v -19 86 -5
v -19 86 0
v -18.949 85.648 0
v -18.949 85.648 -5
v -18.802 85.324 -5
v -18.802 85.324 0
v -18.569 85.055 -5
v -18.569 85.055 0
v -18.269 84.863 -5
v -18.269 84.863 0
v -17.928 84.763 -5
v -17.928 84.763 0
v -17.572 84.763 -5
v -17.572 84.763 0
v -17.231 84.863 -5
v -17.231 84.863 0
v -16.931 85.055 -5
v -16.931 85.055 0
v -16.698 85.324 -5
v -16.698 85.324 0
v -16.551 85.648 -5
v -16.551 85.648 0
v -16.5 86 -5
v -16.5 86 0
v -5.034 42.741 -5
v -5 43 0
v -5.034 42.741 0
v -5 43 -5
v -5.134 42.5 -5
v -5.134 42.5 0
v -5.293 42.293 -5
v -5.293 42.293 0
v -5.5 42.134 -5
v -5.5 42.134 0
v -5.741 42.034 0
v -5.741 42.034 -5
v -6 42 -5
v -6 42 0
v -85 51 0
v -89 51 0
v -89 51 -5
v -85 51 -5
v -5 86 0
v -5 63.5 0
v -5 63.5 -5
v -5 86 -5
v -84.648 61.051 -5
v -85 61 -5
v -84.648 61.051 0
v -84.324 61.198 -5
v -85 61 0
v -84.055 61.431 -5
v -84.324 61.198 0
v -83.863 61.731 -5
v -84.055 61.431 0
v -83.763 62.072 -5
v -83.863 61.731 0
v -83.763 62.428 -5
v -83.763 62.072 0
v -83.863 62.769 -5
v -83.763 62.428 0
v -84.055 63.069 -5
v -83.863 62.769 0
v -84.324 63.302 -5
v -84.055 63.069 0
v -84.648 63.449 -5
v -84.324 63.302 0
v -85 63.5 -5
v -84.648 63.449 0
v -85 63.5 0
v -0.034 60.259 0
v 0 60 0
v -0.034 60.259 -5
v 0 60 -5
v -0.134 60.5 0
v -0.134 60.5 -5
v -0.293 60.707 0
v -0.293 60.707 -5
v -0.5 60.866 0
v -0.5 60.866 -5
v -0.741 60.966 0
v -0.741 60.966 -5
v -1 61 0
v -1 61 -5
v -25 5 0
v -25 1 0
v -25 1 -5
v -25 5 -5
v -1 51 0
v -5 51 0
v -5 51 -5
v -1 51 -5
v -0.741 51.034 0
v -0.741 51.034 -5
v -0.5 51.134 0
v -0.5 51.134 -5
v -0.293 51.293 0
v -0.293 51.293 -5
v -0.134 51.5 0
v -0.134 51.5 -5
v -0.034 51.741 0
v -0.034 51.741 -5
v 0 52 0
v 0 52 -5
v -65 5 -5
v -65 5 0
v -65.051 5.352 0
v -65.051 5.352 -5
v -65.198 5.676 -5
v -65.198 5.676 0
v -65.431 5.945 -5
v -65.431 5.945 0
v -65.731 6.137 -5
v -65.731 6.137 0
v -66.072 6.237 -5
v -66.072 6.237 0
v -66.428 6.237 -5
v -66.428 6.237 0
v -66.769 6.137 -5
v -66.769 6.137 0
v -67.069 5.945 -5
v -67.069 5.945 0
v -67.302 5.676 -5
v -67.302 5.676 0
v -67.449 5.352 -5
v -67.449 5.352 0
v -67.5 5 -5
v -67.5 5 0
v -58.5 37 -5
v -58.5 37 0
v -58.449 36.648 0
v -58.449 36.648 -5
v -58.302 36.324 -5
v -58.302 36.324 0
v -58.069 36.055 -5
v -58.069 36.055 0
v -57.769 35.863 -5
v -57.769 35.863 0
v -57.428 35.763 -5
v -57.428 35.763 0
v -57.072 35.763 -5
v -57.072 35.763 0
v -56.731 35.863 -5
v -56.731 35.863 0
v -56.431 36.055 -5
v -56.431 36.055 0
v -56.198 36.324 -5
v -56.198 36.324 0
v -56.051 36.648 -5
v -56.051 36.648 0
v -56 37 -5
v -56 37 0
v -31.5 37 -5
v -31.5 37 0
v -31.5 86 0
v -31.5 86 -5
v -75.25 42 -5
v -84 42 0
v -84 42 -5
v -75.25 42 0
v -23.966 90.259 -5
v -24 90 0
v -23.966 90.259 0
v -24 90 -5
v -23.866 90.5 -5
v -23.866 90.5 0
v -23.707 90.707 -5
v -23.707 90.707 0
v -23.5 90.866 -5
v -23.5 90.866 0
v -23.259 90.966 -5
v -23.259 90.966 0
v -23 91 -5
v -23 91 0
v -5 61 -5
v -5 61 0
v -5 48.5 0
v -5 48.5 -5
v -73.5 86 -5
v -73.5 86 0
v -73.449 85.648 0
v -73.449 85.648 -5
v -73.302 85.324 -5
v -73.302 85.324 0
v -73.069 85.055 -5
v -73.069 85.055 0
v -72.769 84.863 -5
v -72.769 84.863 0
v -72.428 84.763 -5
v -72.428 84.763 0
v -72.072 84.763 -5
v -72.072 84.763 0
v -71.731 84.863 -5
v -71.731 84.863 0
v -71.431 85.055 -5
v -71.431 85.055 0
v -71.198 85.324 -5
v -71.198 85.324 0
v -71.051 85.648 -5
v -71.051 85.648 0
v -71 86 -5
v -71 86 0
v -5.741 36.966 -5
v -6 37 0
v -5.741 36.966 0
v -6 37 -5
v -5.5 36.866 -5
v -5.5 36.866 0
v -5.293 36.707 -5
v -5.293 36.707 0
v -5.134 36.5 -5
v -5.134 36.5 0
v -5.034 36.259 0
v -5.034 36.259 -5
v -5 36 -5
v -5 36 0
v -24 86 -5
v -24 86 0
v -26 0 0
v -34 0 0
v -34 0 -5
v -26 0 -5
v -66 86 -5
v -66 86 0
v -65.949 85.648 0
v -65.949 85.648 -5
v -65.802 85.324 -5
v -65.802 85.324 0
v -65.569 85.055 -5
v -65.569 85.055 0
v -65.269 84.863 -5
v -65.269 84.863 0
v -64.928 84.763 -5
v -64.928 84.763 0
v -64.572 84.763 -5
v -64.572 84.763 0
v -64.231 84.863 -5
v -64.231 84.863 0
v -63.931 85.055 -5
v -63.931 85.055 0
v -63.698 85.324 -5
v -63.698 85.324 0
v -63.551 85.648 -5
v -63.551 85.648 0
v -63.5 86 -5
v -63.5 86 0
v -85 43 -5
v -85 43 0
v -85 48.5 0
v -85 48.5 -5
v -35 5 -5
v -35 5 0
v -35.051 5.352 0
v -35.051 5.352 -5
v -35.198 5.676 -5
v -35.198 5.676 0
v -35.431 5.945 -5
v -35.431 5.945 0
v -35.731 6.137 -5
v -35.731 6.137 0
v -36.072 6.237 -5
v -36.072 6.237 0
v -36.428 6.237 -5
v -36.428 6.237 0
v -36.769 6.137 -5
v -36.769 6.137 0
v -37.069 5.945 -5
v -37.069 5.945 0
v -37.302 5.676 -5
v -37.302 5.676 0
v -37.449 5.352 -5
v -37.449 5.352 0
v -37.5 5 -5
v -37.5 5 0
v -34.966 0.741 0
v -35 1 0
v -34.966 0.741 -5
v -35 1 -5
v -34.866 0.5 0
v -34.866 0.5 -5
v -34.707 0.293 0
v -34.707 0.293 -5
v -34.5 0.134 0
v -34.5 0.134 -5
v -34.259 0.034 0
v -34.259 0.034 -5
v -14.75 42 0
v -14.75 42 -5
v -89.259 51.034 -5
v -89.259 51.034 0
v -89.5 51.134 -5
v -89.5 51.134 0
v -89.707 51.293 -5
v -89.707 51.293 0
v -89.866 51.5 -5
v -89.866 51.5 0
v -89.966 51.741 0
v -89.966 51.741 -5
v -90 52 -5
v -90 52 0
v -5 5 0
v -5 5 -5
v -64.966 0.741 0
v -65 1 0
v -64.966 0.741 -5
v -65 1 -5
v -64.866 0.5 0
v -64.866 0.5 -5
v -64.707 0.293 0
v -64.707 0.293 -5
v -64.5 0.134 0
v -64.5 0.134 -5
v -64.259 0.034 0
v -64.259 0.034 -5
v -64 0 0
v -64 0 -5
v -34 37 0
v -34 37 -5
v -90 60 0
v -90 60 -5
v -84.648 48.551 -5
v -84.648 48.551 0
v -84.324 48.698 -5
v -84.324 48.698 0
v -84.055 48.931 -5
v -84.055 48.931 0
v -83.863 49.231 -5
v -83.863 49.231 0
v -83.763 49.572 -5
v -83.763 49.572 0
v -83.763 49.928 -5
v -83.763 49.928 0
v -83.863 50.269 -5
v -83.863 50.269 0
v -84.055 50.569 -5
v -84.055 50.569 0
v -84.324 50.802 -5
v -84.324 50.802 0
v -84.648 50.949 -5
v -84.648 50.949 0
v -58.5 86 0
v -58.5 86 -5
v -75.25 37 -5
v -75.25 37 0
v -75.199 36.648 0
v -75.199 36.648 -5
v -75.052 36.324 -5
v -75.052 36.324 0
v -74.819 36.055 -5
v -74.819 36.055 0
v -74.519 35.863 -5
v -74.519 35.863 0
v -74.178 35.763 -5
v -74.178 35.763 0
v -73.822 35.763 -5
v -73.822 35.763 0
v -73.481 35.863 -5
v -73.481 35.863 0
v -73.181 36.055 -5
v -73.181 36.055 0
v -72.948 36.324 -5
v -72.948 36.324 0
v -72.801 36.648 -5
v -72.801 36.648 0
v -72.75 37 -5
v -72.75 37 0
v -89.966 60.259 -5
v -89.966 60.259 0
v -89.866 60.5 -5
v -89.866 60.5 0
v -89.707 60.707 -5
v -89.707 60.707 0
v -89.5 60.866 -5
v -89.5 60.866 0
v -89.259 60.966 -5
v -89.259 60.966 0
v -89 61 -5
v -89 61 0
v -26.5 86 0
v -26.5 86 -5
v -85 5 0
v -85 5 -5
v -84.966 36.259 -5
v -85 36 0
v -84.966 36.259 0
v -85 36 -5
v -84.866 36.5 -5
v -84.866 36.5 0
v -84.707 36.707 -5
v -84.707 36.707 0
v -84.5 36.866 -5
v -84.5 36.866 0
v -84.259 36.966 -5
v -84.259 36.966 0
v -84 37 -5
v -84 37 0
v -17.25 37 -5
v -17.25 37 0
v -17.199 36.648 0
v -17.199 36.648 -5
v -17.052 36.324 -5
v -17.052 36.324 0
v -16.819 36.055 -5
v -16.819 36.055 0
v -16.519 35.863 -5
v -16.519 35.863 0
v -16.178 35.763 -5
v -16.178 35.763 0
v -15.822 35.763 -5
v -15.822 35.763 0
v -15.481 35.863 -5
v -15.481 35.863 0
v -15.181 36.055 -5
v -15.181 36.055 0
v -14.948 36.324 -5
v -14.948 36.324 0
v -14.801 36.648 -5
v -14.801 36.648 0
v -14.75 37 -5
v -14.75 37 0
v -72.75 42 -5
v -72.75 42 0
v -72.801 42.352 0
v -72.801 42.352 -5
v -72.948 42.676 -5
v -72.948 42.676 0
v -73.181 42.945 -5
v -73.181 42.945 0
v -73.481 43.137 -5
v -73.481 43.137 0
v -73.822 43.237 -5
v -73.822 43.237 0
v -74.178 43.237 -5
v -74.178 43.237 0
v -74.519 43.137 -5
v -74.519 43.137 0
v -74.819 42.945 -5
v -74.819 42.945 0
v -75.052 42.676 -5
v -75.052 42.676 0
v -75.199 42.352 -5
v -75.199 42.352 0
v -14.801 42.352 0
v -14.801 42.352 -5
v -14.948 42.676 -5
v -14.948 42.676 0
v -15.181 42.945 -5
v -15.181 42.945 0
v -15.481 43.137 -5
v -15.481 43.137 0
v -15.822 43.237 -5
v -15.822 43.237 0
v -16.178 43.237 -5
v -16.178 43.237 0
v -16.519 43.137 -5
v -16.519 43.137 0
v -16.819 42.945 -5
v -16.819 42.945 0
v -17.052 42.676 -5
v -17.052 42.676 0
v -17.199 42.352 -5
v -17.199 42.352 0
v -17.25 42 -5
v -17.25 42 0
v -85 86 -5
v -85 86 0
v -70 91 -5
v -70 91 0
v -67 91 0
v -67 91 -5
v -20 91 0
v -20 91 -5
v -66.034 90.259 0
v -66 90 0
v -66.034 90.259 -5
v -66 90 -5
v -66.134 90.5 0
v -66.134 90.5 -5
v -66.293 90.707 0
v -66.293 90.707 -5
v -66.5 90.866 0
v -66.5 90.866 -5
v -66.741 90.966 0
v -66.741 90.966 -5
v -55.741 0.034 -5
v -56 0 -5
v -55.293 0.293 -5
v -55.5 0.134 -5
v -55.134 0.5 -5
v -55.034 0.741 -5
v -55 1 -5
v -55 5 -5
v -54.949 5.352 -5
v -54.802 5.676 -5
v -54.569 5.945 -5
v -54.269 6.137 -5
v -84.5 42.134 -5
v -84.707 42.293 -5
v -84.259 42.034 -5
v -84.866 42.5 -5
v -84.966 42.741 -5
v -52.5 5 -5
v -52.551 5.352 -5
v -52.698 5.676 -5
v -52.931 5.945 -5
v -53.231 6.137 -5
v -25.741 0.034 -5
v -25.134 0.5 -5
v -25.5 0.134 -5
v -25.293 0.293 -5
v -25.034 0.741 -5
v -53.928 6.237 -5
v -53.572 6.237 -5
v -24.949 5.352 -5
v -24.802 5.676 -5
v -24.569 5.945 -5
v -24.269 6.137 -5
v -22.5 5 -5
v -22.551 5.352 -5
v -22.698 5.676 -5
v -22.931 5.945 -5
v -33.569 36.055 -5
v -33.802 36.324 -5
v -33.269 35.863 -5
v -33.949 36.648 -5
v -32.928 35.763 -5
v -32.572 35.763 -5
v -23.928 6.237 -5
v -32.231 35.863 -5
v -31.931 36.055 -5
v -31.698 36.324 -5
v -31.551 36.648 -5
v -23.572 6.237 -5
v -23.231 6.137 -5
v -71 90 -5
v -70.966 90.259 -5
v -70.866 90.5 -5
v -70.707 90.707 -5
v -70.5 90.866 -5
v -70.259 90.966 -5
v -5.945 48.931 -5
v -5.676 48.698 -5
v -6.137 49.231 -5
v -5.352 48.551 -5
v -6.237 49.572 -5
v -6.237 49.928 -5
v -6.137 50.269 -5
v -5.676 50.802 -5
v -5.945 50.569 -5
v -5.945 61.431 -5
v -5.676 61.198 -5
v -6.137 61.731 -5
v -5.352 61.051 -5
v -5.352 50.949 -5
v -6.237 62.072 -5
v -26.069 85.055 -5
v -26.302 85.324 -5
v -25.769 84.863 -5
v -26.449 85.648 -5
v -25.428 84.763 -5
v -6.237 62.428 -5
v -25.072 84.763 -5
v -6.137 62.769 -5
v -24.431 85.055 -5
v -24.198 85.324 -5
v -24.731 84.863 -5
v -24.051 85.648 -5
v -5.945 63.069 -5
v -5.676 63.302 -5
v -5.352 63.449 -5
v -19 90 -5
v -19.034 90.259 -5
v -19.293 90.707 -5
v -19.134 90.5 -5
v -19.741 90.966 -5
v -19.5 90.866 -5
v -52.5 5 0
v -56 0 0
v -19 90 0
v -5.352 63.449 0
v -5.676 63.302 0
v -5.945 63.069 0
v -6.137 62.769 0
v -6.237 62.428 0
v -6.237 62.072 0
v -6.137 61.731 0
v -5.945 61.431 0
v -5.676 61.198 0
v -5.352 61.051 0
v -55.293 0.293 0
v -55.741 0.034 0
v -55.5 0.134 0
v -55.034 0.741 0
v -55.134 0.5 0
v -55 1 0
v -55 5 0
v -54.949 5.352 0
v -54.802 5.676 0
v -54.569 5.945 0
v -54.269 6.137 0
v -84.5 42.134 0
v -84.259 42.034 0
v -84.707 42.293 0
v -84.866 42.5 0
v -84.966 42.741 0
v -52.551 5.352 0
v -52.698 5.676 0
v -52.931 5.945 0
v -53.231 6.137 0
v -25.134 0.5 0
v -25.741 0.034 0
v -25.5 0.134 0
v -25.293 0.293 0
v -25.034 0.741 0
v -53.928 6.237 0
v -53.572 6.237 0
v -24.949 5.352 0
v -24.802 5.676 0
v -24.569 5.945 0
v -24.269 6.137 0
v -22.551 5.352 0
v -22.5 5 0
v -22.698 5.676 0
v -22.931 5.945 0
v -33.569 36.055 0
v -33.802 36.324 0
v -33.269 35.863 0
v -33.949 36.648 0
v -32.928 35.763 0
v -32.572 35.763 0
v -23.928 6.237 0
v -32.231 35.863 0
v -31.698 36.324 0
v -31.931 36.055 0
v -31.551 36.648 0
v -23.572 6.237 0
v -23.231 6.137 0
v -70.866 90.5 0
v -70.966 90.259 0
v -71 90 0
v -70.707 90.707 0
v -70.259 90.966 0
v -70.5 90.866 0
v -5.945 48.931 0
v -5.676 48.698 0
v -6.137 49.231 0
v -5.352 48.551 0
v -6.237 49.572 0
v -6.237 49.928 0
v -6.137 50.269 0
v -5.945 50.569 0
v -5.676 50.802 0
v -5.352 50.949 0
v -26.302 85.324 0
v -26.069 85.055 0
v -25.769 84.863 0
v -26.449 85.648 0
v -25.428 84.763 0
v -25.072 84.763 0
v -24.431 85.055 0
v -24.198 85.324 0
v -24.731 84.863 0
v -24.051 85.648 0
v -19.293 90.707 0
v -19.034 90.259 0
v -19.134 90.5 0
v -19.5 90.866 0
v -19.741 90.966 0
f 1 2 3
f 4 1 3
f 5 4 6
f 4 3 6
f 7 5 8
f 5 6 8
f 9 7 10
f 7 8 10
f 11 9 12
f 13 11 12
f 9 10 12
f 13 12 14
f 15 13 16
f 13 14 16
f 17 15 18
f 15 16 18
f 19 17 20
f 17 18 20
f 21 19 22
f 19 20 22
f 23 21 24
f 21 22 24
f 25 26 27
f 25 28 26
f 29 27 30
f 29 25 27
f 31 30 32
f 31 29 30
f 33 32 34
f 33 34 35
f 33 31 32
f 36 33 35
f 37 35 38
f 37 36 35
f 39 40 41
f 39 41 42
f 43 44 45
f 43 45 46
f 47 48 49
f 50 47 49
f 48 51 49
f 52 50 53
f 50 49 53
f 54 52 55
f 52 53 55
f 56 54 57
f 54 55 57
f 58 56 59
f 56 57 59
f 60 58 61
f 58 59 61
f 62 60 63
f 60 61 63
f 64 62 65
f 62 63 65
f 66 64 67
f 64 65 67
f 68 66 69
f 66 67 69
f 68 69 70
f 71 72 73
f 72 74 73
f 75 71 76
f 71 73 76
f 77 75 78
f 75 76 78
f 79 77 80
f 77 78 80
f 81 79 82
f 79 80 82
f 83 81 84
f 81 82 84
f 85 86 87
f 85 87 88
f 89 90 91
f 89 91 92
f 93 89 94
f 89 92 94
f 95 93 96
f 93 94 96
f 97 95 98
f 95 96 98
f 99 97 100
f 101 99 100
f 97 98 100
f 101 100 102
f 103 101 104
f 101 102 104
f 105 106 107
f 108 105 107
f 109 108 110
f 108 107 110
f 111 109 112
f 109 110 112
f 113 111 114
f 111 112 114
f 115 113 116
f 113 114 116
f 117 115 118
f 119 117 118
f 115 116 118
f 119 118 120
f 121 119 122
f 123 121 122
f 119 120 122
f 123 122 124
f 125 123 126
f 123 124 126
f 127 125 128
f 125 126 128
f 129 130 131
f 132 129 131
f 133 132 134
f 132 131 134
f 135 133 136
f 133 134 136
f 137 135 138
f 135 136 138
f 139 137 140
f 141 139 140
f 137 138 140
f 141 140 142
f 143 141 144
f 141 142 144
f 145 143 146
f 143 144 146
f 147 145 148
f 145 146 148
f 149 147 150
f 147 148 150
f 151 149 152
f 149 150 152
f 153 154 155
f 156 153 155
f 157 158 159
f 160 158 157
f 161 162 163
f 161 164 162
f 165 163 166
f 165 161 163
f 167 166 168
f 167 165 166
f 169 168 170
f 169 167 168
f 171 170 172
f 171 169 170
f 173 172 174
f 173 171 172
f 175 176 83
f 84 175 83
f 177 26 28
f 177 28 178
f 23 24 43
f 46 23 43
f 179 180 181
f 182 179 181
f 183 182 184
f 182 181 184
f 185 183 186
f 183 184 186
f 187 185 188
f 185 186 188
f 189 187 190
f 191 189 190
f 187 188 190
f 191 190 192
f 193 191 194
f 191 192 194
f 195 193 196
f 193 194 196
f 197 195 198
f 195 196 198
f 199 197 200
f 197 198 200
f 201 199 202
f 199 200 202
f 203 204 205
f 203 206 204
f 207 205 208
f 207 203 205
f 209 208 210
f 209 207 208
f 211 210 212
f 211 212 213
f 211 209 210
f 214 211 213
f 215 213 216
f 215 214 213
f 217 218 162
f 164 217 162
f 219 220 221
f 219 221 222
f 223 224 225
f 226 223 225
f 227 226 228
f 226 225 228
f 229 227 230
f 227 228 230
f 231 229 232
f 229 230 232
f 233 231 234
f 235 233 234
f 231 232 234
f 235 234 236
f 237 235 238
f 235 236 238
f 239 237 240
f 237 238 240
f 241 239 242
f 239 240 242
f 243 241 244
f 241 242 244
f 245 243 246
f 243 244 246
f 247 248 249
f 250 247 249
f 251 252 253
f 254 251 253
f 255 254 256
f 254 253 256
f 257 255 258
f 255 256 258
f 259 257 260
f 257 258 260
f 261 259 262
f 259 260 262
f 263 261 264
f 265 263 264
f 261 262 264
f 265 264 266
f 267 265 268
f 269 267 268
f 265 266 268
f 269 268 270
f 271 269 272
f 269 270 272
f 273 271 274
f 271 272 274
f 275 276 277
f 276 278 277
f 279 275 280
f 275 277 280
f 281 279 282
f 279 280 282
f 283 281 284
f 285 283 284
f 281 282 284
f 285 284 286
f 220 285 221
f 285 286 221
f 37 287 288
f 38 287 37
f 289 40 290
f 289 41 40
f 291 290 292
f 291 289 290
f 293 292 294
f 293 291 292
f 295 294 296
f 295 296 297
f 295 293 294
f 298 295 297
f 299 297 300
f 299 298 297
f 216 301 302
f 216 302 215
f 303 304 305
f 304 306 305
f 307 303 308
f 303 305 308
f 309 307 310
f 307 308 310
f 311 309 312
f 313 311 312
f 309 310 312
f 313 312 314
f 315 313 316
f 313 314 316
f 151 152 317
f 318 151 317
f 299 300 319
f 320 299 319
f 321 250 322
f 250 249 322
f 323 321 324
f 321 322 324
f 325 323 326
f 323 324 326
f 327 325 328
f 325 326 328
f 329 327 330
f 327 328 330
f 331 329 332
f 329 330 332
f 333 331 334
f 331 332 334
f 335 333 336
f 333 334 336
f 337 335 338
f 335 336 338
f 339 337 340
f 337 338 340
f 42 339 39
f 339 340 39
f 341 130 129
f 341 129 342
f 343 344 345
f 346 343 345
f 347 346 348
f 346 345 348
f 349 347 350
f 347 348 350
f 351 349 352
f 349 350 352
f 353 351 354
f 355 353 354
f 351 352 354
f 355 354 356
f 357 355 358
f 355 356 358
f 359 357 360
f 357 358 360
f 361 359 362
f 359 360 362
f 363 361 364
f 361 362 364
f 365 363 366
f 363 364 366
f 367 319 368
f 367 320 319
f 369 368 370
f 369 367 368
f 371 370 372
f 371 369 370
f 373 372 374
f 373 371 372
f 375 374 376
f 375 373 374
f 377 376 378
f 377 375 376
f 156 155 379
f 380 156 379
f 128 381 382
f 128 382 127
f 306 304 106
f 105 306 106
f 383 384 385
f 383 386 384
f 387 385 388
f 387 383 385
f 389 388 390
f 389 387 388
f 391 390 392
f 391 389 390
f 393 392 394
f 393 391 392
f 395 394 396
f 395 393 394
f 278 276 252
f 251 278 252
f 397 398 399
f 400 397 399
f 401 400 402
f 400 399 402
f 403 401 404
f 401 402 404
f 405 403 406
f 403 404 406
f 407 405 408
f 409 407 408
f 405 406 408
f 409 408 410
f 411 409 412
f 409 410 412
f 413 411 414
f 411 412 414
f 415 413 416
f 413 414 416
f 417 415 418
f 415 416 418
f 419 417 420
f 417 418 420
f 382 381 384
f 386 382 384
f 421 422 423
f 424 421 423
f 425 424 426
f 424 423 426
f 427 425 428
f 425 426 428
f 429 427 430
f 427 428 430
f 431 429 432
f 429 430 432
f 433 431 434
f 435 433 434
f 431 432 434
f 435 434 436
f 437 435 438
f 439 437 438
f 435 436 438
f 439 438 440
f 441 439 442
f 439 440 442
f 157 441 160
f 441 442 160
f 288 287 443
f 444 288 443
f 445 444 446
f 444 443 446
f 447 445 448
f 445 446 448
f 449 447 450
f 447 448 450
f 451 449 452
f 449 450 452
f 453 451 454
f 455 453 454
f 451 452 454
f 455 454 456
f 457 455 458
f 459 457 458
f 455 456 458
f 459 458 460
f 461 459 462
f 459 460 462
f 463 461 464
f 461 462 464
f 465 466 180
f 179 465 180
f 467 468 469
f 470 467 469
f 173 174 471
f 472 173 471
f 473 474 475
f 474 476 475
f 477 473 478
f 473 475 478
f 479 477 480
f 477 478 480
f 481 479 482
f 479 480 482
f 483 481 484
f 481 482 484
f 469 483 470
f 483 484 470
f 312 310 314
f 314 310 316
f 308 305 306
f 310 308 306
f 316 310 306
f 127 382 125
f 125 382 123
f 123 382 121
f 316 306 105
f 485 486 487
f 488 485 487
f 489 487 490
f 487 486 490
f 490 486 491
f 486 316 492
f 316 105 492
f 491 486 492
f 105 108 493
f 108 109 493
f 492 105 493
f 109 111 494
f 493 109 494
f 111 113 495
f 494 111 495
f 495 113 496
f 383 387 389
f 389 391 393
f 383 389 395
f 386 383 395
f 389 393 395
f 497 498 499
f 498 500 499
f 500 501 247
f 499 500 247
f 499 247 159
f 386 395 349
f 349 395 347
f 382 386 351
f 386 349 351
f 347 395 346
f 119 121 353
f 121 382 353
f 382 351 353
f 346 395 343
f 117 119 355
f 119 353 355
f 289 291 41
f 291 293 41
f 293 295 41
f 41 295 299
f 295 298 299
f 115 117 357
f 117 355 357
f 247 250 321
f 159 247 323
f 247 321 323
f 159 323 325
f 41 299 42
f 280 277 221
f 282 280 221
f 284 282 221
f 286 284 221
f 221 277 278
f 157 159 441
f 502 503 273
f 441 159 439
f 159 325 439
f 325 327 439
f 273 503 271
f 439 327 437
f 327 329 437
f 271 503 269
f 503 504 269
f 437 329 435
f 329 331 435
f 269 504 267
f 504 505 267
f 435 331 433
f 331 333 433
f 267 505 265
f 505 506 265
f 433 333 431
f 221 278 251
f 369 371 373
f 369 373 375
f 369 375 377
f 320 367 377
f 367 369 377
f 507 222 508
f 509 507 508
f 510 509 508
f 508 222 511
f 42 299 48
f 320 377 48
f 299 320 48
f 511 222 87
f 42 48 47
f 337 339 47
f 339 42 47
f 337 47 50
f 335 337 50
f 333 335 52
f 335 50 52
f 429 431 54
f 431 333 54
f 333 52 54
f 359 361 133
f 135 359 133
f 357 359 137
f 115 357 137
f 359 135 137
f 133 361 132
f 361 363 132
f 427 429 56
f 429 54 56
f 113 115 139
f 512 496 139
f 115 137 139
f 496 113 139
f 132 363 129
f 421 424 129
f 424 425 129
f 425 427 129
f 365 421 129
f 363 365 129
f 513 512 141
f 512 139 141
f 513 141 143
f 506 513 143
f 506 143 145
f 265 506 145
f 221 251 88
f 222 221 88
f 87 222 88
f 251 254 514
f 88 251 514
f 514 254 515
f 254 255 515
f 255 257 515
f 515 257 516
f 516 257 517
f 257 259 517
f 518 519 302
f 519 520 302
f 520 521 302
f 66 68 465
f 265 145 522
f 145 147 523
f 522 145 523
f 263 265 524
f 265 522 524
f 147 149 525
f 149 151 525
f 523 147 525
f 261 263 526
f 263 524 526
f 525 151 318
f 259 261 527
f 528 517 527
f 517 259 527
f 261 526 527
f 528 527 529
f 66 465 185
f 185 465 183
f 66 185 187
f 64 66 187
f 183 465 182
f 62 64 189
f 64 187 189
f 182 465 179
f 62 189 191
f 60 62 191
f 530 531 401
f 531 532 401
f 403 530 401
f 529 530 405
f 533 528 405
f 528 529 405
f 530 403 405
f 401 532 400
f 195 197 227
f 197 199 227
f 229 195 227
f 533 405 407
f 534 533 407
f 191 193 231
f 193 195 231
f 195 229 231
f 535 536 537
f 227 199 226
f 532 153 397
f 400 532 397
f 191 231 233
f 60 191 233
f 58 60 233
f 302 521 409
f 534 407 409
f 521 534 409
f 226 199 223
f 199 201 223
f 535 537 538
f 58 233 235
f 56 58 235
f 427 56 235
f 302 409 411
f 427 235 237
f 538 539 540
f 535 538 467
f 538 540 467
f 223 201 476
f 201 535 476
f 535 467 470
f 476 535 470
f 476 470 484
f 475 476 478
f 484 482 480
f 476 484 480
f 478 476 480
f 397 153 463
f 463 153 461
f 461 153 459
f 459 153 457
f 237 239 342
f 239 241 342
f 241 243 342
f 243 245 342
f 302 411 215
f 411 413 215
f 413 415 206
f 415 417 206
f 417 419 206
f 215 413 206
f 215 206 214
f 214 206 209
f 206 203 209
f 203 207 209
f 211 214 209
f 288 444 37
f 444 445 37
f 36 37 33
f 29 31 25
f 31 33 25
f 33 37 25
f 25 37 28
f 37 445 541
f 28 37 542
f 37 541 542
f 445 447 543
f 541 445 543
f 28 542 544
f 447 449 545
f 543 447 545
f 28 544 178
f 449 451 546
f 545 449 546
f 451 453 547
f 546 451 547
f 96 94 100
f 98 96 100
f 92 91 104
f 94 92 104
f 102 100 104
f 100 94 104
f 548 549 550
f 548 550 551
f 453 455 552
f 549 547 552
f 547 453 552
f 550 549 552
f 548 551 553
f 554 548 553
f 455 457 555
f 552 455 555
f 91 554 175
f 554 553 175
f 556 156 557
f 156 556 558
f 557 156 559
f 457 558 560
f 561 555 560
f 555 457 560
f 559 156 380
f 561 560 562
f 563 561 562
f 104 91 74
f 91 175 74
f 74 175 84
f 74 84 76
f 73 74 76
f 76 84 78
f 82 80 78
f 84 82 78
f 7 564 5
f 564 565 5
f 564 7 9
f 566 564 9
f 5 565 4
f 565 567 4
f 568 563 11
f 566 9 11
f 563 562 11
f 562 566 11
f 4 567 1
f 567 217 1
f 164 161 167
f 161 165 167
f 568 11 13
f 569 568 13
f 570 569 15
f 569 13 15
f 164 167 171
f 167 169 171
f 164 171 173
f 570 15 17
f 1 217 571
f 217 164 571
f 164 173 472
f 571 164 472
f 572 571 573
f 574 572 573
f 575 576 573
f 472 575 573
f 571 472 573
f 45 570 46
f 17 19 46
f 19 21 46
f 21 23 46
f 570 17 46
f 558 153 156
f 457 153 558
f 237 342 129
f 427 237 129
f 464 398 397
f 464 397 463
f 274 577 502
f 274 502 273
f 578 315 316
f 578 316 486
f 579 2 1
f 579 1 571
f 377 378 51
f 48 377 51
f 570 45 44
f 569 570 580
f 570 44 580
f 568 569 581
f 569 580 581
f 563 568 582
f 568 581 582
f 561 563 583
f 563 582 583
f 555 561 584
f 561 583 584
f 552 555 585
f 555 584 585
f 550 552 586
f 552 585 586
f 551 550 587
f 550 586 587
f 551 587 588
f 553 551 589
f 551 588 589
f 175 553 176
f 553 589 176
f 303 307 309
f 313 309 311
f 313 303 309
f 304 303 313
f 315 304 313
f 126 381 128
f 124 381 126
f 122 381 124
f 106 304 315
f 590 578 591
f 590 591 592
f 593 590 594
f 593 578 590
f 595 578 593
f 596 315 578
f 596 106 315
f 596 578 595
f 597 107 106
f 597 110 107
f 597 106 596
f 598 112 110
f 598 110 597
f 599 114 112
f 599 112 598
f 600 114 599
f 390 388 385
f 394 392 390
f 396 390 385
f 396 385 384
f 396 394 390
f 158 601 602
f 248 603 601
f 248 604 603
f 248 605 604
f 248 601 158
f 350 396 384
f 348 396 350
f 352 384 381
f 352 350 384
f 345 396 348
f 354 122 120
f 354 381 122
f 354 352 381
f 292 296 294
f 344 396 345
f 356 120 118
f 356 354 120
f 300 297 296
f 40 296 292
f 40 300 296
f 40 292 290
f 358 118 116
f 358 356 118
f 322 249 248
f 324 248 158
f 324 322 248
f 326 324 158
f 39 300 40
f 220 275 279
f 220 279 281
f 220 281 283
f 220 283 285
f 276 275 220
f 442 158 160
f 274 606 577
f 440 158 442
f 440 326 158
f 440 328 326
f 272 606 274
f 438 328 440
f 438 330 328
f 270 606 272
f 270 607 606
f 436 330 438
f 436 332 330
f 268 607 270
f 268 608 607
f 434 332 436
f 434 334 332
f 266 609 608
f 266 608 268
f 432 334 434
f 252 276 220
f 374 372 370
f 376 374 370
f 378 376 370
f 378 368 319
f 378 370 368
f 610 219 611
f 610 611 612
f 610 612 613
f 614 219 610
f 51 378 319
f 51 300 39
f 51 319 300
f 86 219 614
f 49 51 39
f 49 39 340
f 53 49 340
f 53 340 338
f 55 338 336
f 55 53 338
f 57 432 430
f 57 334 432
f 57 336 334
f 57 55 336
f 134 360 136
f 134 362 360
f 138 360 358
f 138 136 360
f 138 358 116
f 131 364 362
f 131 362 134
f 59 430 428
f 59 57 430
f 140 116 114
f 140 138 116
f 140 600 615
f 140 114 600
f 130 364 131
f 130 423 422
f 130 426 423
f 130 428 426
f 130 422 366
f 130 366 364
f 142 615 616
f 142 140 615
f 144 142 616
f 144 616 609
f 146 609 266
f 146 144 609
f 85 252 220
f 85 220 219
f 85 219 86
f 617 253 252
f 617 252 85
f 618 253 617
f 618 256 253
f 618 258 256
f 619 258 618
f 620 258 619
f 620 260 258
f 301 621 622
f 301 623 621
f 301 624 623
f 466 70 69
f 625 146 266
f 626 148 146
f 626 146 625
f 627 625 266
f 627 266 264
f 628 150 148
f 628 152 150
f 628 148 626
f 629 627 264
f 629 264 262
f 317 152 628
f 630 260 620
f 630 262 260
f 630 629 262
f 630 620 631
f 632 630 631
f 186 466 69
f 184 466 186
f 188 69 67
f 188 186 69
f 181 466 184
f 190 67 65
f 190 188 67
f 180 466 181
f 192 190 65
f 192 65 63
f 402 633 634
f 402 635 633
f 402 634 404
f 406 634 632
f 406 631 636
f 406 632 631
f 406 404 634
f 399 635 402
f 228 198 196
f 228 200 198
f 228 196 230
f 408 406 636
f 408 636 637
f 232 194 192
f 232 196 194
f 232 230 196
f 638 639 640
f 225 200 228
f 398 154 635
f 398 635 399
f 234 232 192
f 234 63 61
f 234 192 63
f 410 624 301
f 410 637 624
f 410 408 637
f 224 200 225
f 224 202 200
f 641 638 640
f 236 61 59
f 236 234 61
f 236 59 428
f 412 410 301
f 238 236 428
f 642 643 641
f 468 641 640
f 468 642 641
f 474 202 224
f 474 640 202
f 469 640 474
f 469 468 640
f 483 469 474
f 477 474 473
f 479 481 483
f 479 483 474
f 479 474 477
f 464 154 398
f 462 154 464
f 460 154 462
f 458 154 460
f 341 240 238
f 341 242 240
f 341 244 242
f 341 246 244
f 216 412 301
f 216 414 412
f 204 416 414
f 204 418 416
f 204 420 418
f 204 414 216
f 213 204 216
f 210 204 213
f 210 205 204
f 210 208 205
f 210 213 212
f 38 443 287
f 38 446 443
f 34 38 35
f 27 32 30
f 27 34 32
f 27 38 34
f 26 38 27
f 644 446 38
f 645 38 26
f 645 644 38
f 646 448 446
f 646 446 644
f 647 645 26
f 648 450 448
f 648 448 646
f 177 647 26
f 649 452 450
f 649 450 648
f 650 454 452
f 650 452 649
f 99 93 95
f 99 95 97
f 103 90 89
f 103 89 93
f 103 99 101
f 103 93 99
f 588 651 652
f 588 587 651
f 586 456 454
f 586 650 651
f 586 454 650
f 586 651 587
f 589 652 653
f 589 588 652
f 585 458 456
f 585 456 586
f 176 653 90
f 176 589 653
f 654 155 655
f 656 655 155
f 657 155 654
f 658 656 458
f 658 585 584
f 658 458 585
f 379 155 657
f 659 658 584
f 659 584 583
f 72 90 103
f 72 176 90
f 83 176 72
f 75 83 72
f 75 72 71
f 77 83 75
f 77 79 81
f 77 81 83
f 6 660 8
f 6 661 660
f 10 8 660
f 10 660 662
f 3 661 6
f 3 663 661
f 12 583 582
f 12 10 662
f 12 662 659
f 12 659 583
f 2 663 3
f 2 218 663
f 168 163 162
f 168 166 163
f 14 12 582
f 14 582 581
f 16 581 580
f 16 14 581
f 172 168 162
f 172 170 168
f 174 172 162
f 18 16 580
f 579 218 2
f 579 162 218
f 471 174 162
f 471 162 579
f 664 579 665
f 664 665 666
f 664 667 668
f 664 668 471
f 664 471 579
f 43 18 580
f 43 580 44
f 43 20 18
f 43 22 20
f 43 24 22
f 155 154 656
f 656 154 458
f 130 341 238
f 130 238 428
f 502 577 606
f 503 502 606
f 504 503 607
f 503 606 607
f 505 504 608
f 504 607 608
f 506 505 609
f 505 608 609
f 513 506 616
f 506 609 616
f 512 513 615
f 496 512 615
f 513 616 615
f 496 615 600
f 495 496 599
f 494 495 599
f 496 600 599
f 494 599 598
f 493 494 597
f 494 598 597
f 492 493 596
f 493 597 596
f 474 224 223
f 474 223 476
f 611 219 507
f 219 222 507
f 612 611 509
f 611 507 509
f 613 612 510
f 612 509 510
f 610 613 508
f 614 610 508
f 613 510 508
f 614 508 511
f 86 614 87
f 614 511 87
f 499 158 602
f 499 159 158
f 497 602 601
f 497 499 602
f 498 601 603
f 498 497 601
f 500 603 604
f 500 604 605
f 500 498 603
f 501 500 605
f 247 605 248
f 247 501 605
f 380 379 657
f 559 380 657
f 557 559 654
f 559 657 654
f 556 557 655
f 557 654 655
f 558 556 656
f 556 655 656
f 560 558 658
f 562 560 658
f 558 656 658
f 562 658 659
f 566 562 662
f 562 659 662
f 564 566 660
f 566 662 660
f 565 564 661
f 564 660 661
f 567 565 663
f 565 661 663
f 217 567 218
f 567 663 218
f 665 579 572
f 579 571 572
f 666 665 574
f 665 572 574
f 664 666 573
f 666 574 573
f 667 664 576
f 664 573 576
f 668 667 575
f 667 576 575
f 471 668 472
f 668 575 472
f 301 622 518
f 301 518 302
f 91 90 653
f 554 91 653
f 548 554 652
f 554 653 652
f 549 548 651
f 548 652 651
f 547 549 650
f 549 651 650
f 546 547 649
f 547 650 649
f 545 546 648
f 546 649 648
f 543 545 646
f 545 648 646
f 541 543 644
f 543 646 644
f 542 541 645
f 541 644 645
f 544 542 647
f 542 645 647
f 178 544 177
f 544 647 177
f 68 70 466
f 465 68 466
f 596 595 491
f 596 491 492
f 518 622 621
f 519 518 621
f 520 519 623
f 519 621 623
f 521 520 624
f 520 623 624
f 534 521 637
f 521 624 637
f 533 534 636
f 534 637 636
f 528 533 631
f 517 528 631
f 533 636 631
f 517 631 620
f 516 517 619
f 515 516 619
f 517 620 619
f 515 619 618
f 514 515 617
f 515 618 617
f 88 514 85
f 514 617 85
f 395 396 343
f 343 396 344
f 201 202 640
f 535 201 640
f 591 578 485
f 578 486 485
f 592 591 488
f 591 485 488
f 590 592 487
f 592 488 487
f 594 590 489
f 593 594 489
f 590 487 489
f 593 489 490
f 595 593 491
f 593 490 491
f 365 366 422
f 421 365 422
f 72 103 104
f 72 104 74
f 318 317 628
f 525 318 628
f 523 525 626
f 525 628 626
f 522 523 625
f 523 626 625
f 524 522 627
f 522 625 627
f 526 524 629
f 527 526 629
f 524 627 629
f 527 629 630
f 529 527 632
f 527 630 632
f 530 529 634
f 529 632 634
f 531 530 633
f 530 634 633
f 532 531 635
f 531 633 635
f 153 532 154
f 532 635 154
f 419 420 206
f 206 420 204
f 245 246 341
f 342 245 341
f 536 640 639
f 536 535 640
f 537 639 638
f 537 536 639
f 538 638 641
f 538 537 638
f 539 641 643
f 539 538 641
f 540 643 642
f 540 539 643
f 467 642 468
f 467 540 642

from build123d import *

# Parameters (mm, degrees)
SKETCH_1_W          = 80
SKETCH_1_H          = 81
EXTRUDE_1_DEPTH     = 5
SKETCH_2_W          = 12.25
SKETCH_2_H          = 5
SKETCH_2_W_2        = 27
SKETCH_2_H_2        = 49
CUT_EXTRUDE_1_DEPTH = 10
SKETCH_5_W          = 10
SKETCH_5_H          = 5
SKETCH_5_W_2        = 5
SKETCH_5_H_2        = 10
EXTRUDE_2_DEPTH     = 5
FILLET_1_R          = 1
SKETCH_6_R          = 1.25
CUT_EXTRUDE_4_DEPTH = 10


with BuildPart() as part:
    # 스케치1 → 보스-돌출1 (new body)
    with BuildSketch(Plane.XY):
        with Locations((-45, 45.5)):
            Rectangle(SKETCH_1_W, SKETCH_1_H)
    extrude(amount=-EXTRUDE_1_DEPTH)

    # 스케치2 → 컷-돌출1 (cut)
    with BuildSketch(Plane.XY):
        with Locations((-11.125, 39.5)):
            Rectangle(SKETCH_2_W, SKETCH_2_H)
        with Locations((-45, 61.5)):
            Rectangle(SKETCH_2_W_2, SKETCH_2_H_2)
        with Locations((-78.875, 39.5)):
            Rectangle(SKETCH_2_W, SKETCH_2_H)
    extrude(amount=-CUT_EXTRUDE_1_DEPTH, mode=Mode.SUBTRACT)

    # 스케치5 → 보스-돌출2 (add)
    with BuildSketch(Plane.XY):
        with Locations((-30, 2.5)):
            Rectangle(SKETCH_5_W, SKETCH_5_H)
        with Locations((-60, 2.5)):
            Rectangle(SKETCH_5_W, SKETCH_5_H)
        with Locations((-2.5, 56)):
            Rectangle(SKETCH_5_W_2, SKETCH_5_H_2)
        with Locations((-87.5, 56)):
            Rectangle(SKETCH_5_W_2, SKETCH_5_H_2)
        with Locations((-68.5, 88.5)):
            Rectangle(SKETCH_5_W_2, SKETCH_5_H)
        with Locations((-21.5, 88.5)):
            Rectangle(SKETCH_5_W_2, SKETCH_5_H)
    extrude(amount=-EXTRUDE_2_DEPTH)

    # 필렛1
    fillet_1_edges = [part.edges().sort_by_distance(p)[0] for p in [
        (-19, 91, -2.5),
        (-66, 91, -2.5),
        (-71, 91, -2.5),
        (-24, 91, -2.5),
        (-65, 0, -2.5),
        (-35, 0, -2.5),
        (-55, 0, -2.5),
        (-25, 0, -2.5),
        (-5, 37, -2.5),
        (-5, 42, -2.5),
        (0, 61, -2.5),
        (0, 51, -2.5),
        (-85, 37, -2.5),
        (-85, 42, -2.5),
        (-90, 51, -2.5),
        (-90, 61, -2.5),
    ]]
    fillet(fillet_1_edges, radius=FILLET_1_R)

    # 스케치6 → 컷-돌출4 (cut)
    with BuildSketch(Plane.XY):
        with Locations((-32.75, 37)):
            Circle(SKETCH_6_R)
        with Locations((-57.25, 37)):
            Circle(SKETCH_6_R)
        with Locations((-74, 42)):
            Circle(SKETCH_6_R)
        with Locations((-74, 37)):
            Circle(SKETCH_6_R)
        with Locations((-16, 42)):
            Circle(SKETCH_6_R)
        with Locations((-16, 37)):
            Circle(SKETCH_6_R)
        with Locations((-5, 49.75)):
            Circle(SKETCH_6_R)
        with Locations((-5, 62.25)):
            Circle(SKETCH_6_R)
        with Locations((-85, 62.25)):
            Circle(SKETCH_6_R)
        with Locations((-85, 49.75)):
            Circle(SKETCH_6_R)
        with Locations((-66.25, 5)):
            Circle(SKETCH_6_R)
        with Locations((-53.75, 5)):
            Circle(SKETCH_6_R)
        with Locations((-36.25, 5)):
            Circle(SKETCH_6_R)
        with Locations((-23.75, 5)):
            Circle(SKETCH_6_R)
        with Locations((-72.25, 86)):
            Circle(SKETCH_6_R)
        with Locations((-64.75, 86)):
            Circle(SKETCH_6_R)
        with Locations((-25.25, 86)):
            Circle(SKETCH_6_R)
        with Locations((-17.75, 86)):
            Circle(SKETCH_6_R)
    extrude(amount=-CUT_EXTRUDE_4_DEPTH, mode=Mode.SUBTRACT)


solid = part.part
